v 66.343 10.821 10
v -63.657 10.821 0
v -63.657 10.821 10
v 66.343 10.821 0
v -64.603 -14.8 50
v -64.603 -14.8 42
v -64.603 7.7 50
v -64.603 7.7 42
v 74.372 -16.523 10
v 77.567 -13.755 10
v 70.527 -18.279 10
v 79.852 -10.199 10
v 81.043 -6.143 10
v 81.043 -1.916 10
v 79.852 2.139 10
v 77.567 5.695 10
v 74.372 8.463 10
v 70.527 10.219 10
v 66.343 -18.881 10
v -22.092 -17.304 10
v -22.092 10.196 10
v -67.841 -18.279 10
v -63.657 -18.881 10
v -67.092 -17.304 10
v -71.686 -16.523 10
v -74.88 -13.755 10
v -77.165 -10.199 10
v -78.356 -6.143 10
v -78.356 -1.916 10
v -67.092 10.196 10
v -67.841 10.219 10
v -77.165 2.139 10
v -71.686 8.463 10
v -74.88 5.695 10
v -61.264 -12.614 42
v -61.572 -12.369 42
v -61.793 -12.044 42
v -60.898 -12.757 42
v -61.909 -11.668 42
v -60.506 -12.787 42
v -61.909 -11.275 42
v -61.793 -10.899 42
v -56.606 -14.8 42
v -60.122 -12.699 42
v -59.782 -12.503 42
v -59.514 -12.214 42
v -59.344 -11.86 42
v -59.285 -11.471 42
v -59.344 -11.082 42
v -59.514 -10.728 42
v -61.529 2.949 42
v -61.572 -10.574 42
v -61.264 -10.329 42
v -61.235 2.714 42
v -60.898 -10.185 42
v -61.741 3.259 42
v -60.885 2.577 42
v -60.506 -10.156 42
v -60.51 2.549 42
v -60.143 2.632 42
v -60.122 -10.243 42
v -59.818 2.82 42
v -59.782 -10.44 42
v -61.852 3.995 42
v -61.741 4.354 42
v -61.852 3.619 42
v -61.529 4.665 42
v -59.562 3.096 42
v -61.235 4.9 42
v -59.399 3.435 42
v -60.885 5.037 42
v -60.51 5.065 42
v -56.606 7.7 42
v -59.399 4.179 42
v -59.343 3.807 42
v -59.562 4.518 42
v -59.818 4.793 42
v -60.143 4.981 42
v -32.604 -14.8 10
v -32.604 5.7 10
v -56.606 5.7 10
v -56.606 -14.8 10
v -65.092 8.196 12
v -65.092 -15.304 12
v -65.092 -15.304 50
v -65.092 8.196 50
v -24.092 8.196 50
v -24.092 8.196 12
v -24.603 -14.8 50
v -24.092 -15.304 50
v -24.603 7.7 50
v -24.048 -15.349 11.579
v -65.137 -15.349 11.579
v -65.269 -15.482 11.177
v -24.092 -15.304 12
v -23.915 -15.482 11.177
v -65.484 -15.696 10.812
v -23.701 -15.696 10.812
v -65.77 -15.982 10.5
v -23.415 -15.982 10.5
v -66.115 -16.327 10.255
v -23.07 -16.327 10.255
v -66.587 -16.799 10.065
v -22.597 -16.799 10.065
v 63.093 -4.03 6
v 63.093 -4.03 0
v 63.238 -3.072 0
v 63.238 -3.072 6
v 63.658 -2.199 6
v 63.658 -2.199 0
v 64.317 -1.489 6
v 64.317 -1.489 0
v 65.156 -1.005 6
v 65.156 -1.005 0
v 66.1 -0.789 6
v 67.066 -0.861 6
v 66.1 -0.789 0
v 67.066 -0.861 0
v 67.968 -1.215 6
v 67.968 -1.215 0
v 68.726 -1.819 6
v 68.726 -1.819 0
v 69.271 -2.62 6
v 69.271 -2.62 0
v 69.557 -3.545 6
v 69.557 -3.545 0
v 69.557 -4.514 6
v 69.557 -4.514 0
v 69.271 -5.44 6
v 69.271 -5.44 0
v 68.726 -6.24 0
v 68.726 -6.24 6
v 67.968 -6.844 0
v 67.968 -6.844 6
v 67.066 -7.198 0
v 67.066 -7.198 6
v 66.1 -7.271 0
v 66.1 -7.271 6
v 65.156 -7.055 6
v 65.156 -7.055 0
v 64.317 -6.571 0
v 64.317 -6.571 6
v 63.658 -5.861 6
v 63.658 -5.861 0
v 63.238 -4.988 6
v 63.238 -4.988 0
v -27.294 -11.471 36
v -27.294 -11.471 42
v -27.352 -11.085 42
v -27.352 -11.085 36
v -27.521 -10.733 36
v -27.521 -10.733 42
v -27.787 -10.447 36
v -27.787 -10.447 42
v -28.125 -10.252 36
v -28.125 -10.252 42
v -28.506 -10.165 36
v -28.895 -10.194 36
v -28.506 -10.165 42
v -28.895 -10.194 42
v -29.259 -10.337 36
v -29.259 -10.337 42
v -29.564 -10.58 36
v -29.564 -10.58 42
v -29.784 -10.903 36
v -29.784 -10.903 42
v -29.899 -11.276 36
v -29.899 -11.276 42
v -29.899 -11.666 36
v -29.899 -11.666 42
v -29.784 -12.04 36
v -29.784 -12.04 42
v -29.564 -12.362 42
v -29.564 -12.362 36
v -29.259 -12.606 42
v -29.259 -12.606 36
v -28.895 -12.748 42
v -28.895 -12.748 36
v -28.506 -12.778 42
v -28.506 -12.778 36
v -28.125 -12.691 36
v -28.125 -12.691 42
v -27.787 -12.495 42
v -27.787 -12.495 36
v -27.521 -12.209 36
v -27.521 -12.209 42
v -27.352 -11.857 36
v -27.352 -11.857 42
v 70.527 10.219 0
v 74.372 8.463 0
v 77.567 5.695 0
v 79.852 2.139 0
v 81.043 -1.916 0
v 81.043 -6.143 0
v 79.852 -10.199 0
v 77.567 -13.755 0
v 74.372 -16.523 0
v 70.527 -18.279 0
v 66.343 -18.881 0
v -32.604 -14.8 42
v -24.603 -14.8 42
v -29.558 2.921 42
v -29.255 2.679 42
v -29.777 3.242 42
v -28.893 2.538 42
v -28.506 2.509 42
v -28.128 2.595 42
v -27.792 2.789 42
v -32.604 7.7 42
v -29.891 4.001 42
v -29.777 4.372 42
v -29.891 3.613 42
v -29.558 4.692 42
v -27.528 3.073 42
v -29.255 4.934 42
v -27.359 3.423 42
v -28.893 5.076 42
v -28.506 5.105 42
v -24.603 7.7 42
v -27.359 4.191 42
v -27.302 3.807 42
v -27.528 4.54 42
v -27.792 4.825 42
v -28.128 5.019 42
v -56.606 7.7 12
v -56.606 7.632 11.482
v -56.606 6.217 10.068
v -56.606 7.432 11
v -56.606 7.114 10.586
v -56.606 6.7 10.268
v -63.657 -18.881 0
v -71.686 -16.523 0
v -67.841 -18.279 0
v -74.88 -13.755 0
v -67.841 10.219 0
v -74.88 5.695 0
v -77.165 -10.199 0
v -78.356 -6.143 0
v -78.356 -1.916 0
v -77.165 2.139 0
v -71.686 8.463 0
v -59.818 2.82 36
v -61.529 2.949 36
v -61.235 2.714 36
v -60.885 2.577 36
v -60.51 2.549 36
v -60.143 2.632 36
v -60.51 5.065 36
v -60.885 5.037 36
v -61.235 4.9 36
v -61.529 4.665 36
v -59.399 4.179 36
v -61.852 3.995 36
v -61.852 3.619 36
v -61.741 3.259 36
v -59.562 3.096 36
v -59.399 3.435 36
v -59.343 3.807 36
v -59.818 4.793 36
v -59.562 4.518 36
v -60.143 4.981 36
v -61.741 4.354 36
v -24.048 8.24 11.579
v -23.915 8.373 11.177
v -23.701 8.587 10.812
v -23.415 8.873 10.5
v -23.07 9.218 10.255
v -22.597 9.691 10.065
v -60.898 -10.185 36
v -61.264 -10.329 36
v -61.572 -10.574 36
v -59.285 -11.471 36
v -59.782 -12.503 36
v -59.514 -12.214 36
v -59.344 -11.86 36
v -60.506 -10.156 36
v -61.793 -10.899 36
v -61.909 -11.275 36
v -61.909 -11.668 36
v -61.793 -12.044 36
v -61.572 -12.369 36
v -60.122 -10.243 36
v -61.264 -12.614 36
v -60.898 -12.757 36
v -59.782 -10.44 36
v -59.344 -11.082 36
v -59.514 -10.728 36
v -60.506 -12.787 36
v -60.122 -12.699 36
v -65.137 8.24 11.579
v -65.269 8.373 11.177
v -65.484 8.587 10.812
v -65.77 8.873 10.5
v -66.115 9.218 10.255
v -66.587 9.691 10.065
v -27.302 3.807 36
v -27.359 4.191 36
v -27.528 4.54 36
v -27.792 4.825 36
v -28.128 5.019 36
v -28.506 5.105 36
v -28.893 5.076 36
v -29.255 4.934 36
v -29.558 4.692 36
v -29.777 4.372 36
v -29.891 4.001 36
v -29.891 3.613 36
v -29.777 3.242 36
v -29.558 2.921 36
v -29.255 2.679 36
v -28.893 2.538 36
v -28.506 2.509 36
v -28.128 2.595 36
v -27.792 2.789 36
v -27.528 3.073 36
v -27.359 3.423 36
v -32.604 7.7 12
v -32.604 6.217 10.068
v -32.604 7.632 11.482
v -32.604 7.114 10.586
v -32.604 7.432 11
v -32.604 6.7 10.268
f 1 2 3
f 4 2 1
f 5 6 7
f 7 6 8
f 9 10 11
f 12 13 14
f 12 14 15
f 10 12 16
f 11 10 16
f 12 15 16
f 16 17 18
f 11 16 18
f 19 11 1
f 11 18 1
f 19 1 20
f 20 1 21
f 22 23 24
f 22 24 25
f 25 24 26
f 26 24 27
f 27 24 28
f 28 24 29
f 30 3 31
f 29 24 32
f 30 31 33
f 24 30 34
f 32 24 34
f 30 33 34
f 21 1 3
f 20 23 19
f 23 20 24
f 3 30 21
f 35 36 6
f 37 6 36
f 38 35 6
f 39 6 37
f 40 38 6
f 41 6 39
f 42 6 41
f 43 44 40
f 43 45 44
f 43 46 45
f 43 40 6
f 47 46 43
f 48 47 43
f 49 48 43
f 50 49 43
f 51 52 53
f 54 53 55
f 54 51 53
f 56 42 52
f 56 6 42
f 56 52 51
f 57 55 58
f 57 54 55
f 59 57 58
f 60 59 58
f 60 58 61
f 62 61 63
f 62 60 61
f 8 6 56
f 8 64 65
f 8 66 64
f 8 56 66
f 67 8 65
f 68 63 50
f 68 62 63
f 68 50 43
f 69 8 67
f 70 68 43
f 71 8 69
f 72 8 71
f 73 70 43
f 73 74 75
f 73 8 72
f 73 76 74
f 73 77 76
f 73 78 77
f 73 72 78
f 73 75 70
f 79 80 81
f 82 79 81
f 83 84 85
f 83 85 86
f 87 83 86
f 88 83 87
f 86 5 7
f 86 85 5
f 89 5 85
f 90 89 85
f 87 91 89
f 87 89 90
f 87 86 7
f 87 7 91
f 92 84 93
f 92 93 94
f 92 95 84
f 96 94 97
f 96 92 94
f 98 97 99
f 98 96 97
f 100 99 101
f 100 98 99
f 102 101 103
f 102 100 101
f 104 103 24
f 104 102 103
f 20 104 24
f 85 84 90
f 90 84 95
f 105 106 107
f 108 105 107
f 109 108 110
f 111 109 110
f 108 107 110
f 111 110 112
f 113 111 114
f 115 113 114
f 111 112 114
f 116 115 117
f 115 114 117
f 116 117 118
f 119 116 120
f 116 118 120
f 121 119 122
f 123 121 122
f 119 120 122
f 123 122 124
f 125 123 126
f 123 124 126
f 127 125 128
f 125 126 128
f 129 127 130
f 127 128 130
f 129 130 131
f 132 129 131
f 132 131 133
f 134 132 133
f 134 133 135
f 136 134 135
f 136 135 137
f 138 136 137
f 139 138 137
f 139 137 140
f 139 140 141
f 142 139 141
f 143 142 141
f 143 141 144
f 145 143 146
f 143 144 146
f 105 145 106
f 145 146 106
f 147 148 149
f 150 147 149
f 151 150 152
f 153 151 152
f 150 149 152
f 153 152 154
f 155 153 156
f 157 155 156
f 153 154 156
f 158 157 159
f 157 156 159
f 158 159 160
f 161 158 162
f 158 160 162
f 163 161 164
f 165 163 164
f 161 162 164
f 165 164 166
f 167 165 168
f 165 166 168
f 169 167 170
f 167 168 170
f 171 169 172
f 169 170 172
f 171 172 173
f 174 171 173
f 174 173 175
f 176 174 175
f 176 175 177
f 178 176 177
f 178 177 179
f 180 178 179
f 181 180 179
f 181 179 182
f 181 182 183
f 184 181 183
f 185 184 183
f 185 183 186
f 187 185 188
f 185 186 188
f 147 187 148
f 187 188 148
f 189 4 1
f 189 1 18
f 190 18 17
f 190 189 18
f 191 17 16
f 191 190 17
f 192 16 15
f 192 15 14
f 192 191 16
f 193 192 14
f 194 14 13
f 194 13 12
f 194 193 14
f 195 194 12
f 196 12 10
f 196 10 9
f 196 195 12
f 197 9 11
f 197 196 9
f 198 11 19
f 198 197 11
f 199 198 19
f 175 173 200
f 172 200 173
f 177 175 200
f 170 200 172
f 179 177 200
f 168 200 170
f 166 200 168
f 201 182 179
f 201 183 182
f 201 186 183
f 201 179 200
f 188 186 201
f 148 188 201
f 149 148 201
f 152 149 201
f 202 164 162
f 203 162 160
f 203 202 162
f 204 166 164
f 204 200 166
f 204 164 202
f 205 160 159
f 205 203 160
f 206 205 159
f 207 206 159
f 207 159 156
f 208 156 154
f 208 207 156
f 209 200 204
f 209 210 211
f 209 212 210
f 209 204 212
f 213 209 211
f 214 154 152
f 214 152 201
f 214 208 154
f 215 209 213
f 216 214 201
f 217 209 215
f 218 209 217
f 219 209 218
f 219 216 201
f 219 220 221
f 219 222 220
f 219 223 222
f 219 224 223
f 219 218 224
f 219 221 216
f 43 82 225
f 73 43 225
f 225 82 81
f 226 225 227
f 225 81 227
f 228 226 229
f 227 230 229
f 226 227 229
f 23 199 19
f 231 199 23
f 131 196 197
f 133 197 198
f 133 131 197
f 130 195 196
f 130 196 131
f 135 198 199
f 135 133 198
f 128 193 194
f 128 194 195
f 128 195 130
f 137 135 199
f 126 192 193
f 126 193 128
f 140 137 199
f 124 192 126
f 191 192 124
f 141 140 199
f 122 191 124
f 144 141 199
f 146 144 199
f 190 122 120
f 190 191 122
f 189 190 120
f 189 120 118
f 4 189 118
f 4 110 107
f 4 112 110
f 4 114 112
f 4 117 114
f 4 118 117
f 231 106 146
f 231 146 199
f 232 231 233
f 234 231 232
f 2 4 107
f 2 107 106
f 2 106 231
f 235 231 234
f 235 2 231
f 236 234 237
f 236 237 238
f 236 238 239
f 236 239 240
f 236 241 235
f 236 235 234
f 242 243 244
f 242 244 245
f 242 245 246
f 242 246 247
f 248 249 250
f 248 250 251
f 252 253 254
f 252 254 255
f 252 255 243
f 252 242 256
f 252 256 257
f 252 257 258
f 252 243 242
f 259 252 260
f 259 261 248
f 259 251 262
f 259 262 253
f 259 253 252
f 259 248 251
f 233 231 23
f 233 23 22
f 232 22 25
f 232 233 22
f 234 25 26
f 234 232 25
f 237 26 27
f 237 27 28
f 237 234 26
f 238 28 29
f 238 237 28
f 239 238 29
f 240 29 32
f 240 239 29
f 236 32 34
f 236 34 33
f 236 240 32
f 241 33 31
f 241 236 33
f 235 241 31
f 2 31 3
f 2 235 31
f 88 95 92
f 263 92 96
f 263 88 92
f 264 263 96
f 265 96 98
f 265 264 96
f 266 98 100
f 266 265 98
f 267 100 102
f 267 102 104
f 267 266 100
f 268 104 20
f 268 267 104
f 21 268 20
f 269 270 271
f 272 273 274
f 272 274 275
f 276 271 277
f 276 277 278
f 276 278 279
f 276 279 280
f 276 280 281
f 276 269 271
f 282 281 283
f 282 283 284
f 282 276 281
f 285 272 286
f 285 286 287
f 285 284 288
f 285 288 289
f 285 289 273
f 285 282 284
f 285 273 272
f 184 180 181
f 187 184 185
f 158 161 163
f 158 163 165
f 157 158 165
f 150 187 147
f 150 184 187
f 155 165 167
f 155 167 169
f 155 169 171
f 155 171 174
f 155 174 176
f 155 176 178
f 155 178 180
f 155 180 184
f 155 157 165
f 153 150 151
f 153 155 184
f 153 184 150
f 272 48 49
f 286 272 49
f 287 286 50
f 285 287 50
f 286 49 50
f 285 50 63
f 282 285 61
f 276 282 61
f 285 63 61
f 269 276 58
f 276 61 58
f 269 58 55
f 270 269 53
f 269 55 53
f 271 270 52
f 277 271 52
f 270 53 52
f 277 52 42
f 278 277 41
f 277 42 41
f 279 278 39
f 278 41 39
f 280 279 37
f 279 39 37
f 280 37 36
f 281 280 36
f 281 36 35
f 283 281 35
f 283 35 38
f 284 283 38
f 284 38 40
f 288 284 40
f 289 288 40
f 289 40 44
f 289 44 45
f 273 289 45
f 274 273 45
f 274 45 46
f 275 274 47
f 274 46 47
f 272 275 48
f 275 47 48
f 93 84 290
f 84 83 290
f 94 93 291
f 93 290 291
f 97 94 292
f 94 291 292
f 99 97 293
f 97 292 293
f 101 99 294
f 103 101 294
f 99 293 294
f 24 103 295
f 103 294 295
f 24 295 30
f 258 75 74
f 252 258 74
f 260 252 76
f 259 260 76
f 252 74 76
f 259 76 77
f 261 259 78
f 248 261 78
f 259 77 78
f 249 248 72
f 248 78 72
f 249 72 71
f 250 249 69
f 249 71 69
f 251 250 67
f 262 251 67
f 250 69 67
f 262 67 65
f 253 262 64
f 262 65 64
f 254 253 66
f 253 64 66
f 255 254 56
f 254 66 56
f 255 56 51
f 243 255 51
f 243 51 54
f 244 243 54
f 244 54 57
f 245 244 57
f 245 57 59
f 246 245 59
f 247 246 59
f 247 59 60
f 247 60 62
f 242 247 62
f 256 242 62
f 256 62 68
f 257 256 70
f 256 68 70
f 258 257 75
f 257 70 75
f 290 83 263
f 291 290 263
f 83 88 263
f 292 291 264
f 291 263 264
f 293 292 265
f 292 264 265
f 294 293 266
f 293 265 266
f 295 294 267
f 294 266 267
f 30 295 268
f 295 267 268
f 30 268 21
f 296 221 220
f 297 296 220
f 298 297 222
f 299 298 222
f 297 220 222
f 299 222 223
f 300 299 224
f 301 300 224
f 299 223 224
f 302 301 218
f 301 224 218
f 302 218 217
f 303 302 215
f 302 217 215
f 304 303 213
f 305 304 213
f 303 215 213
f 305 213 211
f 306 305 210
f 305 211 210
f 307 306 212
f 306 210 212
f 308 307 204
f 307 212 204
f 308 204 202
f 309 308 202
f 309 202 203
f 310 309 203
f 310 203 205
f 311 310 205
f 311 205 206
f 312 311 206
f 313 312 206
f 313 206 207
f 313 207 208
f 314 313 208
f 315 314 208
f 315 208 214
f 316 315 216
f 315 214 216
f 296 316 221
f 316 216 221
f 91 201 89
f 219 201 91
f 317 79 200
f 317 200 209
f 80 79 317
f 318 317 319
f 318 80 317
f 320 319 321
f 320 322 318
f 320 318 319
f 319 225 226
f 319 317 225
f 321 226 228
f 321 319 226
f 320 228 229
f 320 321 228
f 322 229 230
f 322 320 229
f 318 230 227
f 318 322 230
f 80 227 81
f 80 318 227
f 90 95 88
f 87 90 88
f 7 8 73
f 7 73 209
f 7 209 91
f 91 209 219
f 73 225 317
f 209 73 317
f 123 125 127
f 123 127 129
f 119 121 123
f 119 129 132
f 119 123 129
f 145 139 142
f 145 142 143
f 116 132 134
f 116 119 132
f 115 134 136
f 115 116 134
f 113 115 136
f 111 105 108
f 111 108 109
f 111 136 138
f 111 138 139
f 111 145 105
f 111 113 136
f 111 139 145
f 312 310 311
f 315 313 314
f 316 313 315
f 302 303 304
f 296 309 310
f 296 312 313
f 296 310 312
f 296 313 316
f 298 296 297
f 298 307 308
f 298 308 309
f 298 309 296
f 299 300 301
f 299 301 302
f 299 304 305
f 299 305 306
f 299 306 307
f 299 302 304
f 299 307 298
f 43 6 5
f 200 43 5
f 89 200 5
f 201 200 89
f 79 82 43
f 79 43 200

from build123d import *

# Parameters (mm, degrees)
BOSS_EXTRUDE1_DEPTH = 10
SKETCH2_R           = 3.25
CUT_EXTRUDE1_DEPTH  = 6
SKETCH3_W           = 41
SKETCH3_H           = 23.5
SKETCH3_W_2         = 40
SKETCH3_H_2         = 22.5
BOSS_EXTRUDE3_DEPTH = 40
SKETCH4_W           = 7.997138399
SKETCH4_H           = 22.5
SKETCH4_W_2         = 8.001104186
BOSS_EXTRUDE4_DEPTH = 32
SKETCH5_R           = 1.261769867
SKETCH5_R_2         = 1.301986765
SKETCH5_R_3         = 1.319264735
SKETCH5_R_4         = 1.310040981
CUT_EXTRUDE2_DEPTH  = 6
FILLET1_R           = 2


with BuildPart() as part:
    # Sketch1 → Boss-Extrude1 (new body)
    with BuildSketch(Plane.XY):
        with BuildLine():
            Line((-63.656716418, 10.820895522), (66.343283582, 10.820895522))
            ThreePointArc((66.343283582, 10.820895522), (81.194029851, -4.029850746), (66.343283582, -18.880597015))
            Line((66.343283582, -18.880597015), (-63.656716418, -18.880597015))
            ThreePointArc((-63.656716418, -18.880597015), (-78.507462687, -4.029850746), (-63.656716418, 10.820895522))
        make_face()
    extrude(amount=BOSS_EXTRUDE1_DEPTH)

    # Sketch2 → Cut-Extrude1 (cut)
    with BuildSketch(Plane(origin=(0, 0, 0), x_dir=(-1, 0, 0), z_dir=(0, 0, -1))):
        with Locations((-66.343283582, -4.029850746)):
            Circle(SKETCH2_R)
    extrude(amount=-CUT_EXTRUDE1_DEPTH, mode=Mode.SUBTRACT)

    # Sketch3 → Boss-Extrude3 (add)
    with BuildSketch(Plane.XY.offset(10)):
        with Locations((-44.592304464, -3.554480068)):
            Rectangle(SKETCH3_W, SKETCH3_H)
        with Locations((-44.603010247, -3.550272792)):
            Rectangle(SKETCH3_W_2, SKETCH3_H_2, mode=Mode.SUBTRACT)
    extrude(amount=BOSS_EXTRUDE3_DEPTH)

    # Sketch4 → Boss-Extrude4 (add)
    with BuildSketch(Plane.XY.offset(10)):
        with Locations((-60.604441048, -3.550272792)):
            Rectangle(SKETCH4_W, SKETCH4_H)
        with Locations((-28.60356234, -3.550272792)):
            Rectangle(SKETCH4_W_2, SKETCH4_H)
    extrude(amount=BOSS_EXTRUDE4_DEPTH)

    # Sketch5 → Cut-Extrude2 (cut)
    with BuildSketch(Plane.XY.offset(42)):
        with Locations((-60.604441048, 3.806910367)):
            Circle(SKETCH5_R)
        with Locations((-28.60356234, 3.806910367)):
            Circle(SKETCH5_R_2)
        with Locations((-60.604441048, -11.471222054)):
            Circle(SKETCH5_R_3)
        with Locations((-28.60356234, -11.471222054)):
            Circle(SKETCH5_R_4)
    extrude(amount=-CUT_EXTRUDE2_DEPTH, mode=Mode.SUBTRACT)

    # Fillet1
    fillet1_edges = [part.edges().sort_by_distance(p)[0] for p in [
        (-65.092304464, -3.554480068, 10),
        (-44.592304464, -15.304480068, 10),
        (-24.092304464, -3.554480068, 10),
        (-44.592304464, 8.195519932, 10),
        (-44.60499314, 7.699727208, 10),
    ]]
    fillet(fillet1_edges, radius=FILLET1_R)


solid = part.part
